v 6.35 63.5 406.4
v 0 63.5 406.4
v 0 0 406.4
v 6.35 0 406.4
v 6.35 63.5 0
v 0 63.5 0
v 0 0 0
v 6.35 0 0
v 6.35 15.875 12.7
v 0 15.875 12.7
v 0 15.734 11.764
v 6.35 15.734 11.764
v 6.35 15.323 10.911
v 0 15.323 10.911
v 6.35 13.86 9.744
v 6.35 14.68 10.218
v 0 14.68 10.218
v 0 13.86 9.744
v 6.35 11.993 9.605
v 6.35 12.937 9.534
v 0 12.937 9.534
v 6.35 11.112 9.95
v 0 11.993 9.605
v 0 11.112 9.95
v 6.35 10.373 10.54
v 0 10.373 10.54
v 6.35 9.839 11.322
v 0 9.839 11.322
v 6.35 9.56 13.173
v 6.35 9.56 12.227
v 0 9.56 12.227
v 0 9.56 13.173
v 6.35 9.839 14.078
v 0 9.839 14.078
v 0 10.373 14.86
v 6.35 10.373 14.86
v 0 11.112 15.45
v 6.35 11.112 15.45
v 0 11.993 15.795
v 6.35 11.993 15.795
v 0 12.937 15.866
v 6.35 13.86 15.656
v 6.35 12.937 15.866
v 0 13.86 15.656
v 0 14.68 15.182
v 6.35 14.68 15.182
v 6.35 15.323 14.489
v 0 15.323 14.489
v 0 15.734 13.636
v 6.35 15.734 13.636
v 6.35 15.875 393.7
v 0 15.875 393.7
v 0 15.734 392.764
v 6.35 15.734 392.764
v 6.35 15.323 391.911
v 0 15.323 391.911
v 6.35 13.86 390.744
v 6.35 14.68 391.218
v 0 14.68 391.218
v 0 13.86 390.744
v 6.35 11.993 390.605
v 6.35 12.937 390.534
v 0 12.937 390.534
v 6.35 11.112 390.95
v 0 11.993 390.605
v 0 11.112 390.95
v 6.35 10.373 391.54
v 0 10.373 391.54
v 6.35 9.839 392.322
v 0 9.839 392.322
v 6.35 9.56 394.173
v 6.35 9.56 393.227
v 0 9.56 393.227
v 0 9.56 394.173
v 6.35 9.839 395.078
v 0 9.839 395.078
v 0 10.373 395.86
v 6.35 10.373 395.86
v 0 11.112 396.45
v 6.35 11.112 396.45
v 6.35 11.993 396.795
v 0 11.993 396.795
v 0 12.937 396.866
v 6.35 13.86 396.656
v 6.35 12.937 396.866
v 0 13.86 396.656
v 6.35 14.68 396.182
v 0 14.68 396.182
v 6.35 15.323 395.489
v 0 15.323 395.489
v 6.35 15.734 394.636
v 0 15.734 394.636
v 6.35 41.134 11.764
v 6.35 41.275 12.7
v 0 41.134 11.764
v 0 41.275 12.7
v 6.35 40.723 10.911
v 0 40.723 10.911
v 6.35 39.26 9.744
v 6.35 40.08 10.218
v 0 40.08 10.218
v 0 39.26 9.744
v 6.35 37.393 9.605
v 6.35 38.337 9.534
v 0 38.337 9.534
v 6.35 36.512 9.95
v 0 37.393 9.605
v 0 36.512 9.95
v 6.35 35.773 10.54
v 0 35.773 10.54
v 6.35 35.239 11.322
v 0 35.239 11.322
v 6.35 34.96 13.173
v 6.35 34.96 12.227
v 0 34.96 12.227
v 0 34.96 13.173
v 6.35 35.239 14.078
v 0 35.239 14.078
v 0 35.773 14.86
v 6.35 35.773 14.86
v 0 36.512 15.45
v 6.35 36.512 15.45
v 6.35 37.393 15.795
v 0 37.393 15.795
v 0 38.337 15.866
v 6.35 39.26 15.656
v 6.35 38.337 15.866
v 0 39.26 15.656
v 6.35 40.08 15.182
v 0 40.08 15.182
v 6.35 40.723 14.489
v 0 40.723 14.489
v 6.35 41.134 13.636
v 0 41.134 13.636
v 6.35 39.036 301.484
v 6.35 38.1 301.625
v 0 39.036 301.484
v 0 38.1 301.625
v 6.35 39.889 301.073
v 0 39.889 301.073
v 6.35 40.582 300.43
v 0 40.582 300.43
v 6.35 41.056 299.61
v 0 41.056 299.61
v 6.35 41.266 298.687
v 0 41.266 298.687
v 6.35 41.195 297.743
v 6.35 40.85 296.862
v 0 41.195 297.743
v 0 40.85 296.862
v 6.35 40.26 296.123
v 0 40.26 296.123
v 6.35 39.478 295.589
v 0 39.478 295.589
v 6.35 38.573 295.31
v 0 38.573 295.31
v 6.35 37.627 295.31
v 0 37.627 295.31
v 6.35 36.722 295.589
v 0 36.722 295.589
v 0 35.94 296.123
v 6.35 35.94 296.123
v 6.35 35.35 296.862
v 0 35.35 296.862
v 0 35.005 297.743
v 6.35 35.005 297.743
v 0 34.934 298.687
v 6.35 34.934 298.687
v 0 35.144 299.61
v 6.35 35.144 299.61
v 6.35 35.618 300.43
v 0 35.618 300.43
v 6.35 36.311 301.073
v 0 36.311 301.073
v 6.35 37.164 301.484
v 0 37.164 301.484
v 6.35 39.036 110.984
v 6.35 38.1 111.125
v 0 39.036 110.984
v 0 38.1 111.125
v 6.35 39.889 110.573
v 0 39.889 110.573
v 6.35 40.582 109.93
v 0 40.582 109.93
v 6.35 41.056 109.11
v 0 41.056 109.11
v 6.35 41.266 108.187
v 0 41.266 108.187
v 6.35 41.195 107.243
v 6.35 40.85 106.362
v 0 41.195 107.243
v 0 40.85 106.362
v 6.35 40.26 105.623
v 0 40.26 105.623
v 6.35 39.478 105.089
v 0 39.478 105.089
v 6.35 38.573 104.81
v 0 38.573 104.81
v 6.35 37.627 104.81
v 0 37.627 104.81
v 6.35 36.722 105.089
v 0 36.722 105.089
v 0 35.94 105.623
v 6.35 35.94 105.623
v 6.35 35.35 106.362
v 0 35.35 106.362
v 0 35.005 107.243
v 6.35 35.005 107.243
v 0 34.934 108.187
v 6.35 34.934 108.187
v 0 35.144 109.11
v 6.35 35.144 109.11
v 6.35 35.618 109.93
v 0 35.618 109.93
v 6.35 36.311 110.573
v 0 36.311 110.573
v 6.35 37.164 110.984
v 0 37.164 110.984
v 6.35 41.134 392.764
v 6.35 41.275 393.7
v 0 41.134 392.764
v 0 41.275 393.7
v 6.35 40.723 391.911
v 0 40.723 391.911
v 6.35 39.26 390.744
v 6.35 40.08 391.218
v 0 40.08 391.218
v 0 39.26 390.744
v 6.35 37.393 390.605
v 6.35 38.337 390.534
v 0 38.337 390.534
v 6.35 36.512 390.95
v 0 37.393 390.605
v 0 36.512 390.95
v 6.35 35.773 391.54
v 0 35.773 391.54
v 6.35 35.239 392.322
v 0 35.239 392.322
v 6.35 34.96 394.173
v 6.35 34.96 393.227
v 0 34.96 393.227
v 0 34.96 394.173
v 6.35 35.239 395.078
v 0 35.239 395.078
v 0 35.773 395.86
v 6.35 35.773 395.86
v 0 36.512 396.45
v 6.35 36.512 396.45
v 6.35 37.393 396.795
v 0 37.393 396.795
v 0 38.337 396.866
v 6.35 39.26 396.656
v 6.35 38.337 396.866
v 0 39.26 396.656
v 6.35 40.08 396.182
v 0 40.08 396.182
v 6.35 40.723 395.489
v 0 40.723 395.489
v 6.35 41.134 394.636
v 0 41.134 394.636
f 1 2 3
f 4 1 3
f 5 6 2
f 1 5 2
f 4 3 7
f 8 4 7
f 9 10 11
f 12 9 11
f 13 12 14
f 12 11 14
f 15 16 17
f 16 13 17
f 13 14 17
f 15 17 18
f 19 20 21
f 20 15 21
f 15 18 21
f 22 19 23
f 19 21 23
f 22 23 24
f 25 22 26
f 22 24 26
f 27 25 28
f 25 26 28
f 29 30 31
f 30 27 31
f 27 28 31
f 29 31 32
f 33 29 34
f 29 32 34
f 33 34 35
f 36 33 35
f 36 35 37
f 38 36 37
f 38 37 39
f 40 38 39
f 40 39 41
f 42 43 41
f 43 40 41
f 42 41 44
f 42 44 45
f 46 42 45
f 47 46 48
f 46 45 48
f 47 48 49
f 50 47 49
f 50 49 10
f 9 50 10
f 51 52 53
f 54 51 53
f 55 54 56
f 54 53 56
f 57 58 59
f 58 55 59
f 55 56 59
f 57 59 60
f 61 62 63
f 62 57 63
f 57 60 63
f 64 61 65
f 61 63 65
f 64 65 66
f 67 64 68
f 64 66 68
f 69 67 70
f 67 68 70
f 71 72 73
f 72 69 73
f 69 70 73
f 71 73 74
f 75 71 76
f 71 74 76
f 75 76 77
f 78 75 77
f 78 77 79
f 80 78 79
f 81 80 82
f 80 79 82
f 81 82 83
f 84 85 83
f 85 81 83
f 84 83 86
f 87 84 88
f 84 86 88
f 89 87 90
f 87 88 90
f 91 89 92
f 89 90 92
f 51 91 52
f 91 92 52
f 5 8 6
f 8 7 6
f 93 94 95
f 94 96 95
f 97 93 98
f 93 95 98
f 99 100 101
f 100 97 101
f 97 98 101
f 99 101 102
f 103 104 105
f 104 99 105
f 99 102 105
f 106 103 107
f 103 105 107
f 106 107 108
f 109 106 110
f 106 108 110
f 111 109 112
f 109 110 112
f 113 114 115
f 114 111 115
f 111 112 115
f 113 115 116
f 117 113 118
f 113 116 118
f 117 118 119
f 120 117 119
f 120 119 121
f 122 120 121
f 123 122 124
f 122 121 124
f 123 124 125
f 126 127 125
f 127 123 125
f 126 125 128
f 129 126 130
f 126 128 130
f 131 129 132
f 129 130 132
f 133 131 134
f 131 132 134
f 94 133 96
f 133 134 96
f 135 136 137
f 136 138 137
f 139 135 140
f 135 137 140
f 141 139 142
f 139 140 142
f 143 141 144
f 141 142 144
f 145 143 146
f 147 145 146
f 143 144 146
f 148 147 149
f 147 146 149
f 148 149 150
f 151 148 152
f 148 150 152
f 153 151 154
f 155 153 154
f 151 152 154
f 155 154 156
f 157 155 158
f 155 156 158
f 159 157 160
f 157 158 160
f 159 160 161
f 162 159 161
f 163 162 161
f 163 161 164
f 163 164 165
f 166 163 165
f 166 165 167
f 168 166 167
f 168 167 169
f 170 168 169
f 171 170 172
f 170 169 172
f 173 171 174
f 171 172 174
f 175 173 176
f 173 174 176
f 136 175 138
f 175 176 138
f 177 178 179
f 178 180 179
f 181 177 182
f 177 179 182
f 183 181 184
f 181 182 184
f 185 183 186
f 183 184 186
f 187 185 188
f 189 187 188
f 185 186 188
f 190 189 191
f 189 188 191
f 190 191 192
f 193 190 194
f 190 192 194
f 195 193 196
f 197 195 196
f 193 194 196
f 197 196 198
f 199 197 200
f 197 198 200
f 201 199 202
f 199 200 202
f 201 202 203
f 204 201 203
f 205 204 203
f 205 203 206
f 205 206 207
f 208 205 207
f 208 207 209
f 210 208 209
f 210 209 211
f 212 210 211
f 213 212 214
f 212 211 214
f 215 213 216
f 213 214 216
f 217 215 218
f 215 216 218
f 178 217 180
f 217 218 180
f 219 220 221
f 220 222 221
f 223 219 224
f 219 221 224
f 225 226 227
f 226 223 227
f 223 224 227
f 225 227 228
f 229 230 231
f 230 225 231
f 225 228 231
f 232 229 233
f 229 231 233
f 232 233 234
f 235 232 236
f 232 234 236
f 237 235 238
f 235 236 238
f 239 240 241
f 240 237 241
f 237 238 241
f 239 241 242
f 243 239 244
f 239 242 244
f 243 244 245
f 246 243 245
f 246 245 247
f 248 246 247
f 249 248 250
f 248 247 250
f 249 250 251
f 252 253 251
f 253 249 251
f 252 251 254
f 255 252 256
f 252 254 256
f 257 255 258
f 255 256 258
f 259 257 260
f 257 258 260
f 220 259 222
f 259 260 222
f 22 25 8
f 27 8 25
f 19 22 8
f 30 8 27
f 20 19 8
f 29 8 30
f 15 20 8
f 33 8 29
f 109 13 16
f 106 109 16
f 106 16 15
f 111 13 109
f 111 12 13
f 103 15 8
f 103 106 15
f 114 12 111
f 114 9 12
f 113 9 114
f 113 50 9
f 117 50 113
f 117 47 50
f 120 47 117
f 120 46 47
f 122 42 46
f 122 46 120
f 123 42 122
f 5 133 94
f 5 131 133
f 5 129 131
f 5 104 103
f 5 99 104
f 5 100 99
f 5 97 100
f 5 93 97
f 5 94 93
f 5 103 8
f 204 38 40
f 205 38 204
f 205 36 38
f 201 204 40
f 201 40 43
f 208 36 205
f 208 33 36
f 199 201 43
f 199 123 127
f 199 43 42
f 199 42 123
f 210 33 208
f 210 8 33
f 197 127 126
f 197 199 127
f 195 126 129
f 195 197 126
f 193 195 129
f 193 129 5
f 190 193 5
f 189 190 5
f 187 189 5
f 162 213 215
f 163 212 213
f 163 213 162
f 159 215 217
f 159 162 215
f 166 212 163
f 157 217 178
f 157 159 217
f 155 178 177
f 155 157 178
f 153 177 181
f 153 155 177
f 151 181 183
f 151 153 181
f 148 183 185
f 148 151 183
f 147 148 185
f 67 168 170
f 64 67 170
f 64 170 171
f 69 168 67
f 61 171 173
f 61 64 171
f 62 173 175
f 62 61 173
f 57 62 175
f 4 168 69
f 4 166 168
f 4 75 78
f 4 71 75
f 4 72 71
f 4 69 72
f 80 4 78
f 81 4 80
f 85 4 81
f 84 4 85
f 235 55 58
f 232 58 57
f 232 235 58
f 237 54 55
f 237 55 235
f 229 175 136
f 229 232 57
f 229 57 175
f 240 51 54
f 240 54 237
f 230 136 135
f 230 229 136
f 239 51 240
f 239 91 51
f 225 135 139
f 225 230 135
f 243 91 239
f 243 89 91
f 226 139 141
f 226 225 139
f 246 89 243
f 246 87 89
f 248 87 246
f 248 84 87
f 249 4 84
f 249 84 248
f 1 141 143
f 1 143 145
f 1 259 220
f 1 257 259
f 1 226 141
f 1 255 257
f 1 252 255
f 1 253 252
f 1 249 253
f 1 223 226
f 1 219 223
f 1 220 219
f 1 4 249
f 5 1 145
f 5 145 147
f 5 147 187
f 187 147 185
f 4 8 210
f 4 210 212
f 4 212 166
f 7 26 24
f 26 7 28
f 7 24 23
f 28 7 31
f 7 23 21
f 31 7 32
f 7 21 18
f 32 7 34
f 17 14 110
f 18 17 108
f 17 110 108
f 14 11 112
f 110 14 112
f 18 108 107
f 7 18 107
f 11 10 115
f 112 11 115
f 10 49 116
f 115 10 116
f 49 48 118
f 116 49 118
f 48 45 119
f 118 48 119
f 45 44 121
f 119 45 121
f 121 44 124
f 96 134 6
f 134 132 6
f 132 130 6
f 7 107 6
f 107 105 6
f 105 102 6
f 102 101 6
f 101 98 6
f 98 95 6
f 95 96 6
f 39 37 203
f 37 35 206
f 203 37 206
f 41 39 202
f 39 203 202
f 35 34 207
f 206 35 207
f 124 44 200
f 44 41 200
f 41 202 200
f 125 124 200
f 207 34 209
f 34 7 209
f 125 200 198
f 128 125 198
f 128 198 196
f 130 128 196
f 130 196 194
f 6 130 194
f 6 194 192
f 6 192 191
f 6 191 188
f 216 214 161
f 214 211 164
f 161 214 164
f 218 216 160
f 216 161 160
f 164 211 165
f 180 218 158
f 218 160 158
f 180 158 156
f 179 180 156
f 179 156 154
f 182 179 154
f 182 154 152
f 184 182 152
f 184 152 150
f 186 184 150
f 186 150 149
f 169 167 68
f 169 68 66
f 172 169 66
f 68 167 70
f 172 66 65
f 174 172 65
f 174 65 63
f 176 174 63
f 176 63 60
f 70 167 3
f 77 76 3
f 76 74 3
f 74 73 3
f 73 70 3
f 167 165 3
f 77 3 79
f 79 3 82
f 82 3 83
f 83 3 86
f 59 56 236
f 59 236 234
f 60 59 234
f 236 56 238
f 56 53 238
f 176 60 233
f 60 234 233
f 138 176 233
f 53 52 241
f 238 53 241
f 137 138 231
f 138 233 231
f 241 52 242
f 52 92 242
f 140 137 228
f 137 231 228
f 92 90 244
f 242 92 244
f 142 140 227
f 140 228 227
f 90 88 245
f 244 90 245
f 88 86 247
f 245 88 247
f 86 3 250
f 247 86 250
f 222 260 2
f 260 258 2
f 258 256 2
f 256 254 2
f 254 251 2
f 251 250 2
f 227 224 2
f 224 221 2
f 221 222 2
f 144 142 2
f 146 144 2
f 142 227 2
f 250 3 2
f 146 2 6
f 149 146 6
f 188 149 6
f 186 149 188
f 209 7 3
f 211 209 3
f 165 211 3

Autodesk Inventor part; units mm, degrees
ref_plane "YZ Plane" through (0, 0, 0) normal (1, 0, 0) x (0, 1, 0)
ref_plane "XZ Plane" through (0, 0, 0) normal (0, 1, 0) x (-1, 0, 0)
ref_plane "XY Plane" through (0, 0, 0) normal (0, 0, 1) x (1, 0, 0)
sketch "Sketch1" plane through (0, 0, 0) normal (1, 0, 0) x (0, 1, 0)
  line L0 (0, 0) -> (63.5, 0)
  line L1 (63.5, 0) -> (63.5, 406.4)
  line L2 (63.5, 406.4) -> (0, 406.4)
  line L3 (0, 406.4) -> (0, 0)
  circle A0 centre (38.1, 393.7) radius 3.175
  circle A1 centre (12.7, 393.7) radius 3.175
  circle A2 centre (38.1, 12.7) radius 3.175
  circle A3 centre (12.7, 12.7) radius 3.175
  dimension "d0" = 63.5
  dimension "d1" = 406.4
  dimension "d2" = 6.35
  dimension "d3" = 6.35
  dimension "d4" = 6.35
  dimension "d5" = 6.35
  dimension "d6" = 12.7
  dimension "d7" = 12.7
  dimension "d8" = 12.7
  dimension "d9" = 25.4
  dimension "d10" = 25.4
  dimension "d11" = 12.7
  dimension "d12" = 12.7
  dimension "d13" = 25.4
extrude "Extrusion1" add sketch "Sketch1" along normal blind 6.35
sketch "Sketch2" plane through (0, 0, 0) normal (-1, 0, 0) x (0, 0, 1)
  circle A0 centre (107.95, 38.1) radius 3.175
  circle A1 centre (298.45, 38.1) radius 3.175
  line L0 (0, 63.5) -> (406.4, 63.5) projected
  line L1 (0, 0) -> (0, 63.5) projected
  line L2 (406.4, 63.5) -> (406.4, 0) projected
  dimension "d16" = 6.35
  dimension "d17" = 6.35
  dimension "d18" = 25.4
  dimension "d19" = 25.4
  dimension "d20" = 107.95
  dimension "d21" = 107.95
extrude "Extrusion2" cut sketch "Sketch2" against normal blind 6.35
properties part number "15102898-16-P-0403" material "LCP Plastic"
